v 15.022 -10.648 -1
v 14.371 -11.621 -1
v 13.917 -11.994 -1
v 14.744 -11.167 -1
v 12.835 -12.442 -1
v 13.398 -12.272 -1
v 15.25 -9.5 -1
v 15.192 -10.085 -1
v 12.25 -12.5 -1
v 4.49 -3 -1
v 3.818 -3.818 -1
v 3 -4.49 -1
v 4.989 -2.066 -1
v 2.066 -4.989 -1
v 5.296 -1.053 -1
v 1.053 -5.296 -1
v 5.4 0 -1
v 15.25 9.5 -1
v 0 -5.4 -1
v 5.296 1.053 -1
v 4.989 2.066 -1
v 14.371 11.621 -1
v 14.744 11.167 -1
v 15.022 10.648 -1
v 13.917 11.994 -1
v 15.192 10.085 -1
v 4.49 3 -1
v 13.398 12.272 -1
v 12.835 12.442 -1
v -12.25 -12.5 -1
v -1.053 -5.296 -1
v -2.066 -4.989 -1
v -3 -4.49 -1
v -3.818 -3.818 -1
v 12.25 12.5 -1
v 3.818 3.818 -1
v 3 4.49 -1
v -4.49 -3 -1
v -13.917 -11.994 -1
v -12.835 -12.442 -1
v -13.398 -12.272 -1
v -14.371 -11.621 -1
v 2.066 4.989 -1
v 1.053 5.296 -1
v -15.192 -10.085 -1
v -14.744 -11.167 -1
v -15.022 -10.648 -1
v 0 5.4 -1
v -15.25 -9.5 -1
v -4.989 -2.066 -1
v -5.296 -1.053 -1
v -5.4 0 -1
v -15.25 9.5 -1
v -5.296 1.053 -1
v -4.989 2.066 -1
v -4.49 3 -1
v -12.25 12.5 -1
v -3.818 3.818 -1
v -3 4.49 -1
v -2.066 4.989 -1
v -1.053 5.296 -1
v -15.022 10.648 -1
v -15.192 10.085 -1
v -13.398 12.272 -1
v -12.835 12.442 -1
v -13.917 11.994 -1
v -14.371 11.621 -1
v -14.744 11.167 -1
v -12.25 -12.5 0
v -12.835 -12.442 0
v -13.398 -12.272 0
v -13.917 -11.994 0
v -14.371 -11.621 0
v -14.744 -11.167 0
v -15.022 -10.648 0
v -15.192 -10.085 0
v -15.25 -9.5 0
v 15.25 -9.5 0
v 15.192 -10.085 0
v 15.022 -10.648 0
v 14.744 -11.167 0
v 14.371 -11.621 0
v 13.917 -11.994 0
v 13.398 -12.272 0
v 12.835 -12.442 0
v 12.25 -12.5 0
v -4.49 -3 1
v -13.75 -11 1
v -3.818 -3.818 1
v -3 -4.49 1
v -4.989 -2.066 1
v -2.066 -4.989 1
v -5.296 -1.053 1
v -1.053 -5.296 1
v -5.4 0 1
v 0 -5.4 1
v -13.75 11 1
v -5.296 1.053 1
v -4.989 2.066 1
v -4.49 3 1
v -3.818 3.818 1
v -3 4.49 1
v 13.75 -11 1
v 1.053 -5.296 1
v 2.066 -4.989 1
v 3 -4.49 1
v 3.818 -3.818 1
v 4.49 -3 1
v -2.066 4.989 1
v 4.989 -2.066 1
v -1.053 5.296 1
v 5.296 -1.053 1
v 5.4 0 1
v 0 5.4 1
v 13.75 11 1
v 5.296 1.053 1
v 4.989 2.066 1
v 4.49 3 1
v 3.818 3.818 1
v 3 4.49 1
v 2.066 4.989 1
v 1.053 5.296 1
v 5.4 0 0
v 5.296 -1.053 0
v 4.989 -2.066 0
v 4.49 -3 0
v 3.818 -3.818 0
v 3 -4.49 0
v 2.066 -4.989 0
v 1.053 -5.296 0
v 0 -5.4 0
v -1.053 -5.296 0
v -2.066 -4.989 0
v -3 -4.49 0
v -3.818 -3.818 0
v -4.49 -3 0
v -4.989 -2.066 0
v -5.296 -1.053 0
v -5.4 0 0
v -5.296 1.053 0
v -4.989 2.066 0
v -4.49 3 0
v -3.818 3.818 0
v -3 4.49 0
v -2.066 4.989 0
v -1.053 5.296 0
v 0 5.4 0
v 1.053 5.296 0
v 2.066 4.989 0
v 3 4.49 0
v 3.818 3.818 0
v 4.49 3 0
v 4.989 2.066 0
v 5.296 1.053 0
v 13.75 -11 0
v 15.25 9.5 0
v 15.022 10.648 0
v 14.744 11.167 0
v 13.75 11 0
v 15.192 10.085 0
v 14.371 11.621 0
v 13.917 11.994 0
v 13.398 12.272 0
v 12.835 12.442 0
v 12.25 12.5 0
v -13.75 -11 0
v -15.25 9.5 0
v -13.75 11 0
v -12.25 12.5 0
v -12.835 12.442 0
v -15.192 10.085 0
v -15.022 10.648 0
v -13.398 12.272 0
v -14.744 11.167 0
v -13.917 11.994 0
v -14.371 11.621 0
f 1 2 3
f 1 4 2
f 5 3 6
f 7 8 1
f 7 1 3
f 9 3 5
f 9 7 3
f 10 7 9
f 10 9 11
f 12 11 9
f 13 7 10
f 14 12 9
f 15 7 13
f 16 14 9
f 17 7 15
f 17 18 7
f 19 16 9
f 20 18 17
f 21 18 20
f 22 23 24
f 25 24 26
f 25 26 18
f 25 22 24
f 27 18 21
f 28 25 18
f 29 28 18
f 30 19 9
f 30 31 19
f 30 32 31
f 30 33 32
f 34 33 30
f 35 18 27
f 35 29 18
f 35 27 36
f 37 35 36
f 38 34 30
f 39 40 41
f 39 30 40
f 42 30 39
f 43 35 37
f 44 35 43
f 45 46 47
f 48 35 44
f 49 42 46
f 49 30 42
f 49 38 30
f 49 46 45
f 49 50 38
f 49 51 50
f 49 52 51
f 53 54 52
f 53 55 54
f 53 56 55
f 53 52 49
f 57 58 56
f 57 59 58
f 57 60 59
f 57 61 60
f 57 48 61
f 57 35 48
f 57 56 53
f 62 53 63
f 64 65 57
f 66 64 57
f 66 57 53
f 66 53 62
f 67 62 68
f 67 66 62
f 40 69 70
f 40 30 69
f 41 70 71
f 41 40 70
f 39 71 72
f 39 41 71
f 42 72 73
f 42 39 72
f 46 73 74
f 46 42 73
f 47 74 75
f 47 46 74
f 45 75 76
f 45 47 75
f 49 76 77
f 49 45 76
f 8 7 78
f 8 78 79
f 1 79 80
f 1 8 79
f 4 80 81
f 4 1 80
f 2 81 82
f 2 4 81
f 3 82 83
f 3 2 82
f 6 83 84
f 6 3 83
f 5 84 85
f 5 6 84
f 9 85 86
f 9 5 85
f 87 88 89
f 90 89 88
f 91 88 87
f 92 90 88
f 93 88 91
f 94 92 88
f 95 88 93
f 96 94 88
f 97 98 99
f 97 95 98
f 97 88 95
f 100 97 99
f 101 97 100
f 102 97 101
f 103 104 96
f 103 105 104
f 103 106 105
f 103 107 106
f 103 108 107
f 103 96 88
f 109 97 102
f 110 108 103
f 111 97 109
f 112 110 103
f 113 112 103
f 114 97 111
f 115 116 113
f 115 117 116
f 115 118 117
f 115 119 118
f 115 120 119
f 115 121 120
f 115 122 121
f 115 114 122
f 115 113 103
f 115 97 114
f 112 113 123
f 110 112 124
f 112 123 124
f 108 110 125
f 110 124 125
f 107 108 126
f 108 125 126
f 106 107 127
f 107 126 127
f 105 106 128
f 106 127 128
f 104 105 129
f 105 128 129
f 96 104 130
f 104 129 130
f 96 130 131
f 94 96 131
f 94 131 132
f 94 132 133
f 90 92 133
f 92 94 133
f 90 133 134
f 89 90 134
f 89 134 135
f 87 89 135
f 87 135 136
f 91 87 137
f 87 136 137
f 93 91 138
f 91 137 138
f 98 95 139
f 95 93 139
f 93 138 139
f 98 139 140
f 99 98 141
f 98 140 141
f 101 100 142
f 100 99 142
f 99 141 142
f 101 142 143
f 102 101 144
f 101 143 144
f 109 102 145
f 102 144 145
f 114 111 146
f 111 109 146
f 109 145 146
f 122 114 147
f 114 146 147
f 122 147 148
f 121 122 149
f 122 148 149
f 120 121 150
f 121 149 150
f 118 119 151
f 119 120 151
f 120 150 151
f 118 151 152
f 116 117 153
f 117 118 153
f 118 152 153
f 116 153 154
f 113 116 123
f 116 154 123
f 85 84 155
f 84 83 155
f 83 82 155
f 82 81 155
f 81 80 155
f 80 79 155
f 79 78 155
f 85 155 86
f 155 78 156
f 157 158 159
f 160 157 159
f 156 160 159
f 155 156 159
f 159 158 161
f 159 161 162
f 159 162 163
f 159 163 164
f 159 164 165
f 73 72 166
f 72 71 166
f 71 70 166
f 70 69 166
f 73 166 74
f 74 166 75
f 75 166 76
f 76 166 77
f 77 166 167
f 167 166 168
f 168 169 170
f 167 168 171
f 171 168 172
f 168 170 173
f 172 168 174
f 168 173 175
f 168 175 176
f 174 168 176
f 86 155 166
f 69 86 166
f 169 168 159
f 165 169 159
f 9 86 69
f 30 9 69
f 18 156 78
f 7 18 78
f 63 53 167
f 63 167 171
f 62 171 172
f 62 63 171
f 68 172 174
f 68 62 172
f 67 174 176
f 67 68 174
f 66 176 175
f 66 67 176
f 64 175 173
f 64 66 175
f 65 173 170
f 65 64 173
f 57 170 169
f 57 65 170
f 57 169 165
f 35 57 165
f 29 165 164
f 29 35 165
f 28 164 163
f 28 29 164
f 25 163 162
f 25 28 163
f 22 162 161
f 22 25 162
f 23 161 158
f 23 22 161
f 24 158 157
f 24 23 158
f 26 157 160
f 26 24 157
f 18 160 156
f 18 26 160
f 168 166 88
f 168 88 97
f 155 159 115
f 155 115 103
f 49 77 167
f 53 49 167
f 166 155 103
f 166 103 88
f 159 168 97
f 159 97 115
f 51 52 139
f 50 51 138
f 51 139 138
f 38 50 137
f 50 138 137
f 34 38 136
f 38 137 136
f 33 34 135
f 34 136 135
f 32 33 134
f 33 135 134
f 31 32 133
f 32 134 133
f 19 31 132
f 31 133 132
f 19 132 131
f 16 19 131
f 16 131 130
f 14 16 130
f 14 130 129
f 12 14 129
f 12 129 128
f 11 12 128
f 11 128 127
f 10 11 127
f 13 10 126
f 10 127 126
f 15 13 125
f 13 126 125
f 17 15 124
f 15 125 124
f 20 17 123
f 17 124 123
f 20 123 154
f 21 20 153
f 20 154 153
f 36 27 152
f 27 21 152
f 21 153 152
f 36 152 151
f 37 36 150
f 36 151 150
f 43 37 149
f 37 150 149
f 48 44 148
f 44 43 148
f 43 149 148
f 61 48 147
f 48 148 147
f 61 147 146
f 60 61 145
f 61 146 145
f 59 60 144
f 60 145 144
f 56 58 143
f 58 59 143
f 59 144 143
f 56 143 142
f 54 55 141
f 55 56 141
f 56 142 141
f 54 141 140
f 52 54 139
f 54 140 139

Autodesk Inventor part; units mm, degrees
ref_plane "YZ Plane" through (0, 0, 0) normal (1, 0, 0) x (0, 1, 0)
ref_plane "XZ Plane" through (0, 0, 0) normal (0, 1, 0) x (-1, 0, 0)
ref_plane "XY Plane" through (0, 0, 0) normal (0, 0, 1) x (1, 0, 0)
sketch "Sketch1" plane through (0, 0, 0) normal (0, 0, 1) x (1, 0, 0)
  line L0 (13.75, -11) -> (-13.75, -11)
  line L1 (-13.75, -11) -> (-13.75, 11)
  line L2 (-13.75, 11) -> (13.75, 11)
  line L3 (13.75, 11) -> (13.75, -11)
  line L4 (13.75, -11) -> (-13.75, 11) construction
  line L5 (-13.75, -11) -> (13.75, 11) construction
  circle A0 centre (0, 0) radius 5.4
  dimension "d0" = 27.5
  dimension "d1" = 22
  dimension "d2" = 10.8
extrude "Extrusion1" add sketch "Sketch1" along normal blind 1
sketch "Sketch2" plane through (0, 0, 0) normal (0, 0, -1) x (-1, 0, 0)
  line L0 (15.25, 12.5) -> (-15.25, 12.5)
  line L1 (-15.25, 12.5) -> (-15.25, -12.5)
  line L2 (-15.25, -12.5) -> (15.25, -12.5)
  line L3 (15.25, -12.5) -> (15.25, 12.5)
  line L4 (15.25, 12.5) -> (-15.25, -12.5) construction
  line L5 (-15.25, 12.5) -> (15.25, -12.5) construction
  line L6 (-13.75, -11) -> (-13.75, 11) projected
  line L7 (-13.75, 11) -> (13.75, 11) projected
  circle A0 centre (0, 0) radius 5.4
  circle A1 centre (0, 0) radius 5.4 projected
  dimension "d5" = 1.5
  dimension "d6" = 1.5
extrude "Extrusion2" add sketch "Sketch2" along normal blind 1
fillet "Fillet1" radius 3 4 edges at (-15.25, 12.5, -0.5) (-15.25, -12.5, -0.5) (15.25, -12.5, -0.5) (15.25, 12.5, -0.5)
properties part number "screen-dc-port-front"
